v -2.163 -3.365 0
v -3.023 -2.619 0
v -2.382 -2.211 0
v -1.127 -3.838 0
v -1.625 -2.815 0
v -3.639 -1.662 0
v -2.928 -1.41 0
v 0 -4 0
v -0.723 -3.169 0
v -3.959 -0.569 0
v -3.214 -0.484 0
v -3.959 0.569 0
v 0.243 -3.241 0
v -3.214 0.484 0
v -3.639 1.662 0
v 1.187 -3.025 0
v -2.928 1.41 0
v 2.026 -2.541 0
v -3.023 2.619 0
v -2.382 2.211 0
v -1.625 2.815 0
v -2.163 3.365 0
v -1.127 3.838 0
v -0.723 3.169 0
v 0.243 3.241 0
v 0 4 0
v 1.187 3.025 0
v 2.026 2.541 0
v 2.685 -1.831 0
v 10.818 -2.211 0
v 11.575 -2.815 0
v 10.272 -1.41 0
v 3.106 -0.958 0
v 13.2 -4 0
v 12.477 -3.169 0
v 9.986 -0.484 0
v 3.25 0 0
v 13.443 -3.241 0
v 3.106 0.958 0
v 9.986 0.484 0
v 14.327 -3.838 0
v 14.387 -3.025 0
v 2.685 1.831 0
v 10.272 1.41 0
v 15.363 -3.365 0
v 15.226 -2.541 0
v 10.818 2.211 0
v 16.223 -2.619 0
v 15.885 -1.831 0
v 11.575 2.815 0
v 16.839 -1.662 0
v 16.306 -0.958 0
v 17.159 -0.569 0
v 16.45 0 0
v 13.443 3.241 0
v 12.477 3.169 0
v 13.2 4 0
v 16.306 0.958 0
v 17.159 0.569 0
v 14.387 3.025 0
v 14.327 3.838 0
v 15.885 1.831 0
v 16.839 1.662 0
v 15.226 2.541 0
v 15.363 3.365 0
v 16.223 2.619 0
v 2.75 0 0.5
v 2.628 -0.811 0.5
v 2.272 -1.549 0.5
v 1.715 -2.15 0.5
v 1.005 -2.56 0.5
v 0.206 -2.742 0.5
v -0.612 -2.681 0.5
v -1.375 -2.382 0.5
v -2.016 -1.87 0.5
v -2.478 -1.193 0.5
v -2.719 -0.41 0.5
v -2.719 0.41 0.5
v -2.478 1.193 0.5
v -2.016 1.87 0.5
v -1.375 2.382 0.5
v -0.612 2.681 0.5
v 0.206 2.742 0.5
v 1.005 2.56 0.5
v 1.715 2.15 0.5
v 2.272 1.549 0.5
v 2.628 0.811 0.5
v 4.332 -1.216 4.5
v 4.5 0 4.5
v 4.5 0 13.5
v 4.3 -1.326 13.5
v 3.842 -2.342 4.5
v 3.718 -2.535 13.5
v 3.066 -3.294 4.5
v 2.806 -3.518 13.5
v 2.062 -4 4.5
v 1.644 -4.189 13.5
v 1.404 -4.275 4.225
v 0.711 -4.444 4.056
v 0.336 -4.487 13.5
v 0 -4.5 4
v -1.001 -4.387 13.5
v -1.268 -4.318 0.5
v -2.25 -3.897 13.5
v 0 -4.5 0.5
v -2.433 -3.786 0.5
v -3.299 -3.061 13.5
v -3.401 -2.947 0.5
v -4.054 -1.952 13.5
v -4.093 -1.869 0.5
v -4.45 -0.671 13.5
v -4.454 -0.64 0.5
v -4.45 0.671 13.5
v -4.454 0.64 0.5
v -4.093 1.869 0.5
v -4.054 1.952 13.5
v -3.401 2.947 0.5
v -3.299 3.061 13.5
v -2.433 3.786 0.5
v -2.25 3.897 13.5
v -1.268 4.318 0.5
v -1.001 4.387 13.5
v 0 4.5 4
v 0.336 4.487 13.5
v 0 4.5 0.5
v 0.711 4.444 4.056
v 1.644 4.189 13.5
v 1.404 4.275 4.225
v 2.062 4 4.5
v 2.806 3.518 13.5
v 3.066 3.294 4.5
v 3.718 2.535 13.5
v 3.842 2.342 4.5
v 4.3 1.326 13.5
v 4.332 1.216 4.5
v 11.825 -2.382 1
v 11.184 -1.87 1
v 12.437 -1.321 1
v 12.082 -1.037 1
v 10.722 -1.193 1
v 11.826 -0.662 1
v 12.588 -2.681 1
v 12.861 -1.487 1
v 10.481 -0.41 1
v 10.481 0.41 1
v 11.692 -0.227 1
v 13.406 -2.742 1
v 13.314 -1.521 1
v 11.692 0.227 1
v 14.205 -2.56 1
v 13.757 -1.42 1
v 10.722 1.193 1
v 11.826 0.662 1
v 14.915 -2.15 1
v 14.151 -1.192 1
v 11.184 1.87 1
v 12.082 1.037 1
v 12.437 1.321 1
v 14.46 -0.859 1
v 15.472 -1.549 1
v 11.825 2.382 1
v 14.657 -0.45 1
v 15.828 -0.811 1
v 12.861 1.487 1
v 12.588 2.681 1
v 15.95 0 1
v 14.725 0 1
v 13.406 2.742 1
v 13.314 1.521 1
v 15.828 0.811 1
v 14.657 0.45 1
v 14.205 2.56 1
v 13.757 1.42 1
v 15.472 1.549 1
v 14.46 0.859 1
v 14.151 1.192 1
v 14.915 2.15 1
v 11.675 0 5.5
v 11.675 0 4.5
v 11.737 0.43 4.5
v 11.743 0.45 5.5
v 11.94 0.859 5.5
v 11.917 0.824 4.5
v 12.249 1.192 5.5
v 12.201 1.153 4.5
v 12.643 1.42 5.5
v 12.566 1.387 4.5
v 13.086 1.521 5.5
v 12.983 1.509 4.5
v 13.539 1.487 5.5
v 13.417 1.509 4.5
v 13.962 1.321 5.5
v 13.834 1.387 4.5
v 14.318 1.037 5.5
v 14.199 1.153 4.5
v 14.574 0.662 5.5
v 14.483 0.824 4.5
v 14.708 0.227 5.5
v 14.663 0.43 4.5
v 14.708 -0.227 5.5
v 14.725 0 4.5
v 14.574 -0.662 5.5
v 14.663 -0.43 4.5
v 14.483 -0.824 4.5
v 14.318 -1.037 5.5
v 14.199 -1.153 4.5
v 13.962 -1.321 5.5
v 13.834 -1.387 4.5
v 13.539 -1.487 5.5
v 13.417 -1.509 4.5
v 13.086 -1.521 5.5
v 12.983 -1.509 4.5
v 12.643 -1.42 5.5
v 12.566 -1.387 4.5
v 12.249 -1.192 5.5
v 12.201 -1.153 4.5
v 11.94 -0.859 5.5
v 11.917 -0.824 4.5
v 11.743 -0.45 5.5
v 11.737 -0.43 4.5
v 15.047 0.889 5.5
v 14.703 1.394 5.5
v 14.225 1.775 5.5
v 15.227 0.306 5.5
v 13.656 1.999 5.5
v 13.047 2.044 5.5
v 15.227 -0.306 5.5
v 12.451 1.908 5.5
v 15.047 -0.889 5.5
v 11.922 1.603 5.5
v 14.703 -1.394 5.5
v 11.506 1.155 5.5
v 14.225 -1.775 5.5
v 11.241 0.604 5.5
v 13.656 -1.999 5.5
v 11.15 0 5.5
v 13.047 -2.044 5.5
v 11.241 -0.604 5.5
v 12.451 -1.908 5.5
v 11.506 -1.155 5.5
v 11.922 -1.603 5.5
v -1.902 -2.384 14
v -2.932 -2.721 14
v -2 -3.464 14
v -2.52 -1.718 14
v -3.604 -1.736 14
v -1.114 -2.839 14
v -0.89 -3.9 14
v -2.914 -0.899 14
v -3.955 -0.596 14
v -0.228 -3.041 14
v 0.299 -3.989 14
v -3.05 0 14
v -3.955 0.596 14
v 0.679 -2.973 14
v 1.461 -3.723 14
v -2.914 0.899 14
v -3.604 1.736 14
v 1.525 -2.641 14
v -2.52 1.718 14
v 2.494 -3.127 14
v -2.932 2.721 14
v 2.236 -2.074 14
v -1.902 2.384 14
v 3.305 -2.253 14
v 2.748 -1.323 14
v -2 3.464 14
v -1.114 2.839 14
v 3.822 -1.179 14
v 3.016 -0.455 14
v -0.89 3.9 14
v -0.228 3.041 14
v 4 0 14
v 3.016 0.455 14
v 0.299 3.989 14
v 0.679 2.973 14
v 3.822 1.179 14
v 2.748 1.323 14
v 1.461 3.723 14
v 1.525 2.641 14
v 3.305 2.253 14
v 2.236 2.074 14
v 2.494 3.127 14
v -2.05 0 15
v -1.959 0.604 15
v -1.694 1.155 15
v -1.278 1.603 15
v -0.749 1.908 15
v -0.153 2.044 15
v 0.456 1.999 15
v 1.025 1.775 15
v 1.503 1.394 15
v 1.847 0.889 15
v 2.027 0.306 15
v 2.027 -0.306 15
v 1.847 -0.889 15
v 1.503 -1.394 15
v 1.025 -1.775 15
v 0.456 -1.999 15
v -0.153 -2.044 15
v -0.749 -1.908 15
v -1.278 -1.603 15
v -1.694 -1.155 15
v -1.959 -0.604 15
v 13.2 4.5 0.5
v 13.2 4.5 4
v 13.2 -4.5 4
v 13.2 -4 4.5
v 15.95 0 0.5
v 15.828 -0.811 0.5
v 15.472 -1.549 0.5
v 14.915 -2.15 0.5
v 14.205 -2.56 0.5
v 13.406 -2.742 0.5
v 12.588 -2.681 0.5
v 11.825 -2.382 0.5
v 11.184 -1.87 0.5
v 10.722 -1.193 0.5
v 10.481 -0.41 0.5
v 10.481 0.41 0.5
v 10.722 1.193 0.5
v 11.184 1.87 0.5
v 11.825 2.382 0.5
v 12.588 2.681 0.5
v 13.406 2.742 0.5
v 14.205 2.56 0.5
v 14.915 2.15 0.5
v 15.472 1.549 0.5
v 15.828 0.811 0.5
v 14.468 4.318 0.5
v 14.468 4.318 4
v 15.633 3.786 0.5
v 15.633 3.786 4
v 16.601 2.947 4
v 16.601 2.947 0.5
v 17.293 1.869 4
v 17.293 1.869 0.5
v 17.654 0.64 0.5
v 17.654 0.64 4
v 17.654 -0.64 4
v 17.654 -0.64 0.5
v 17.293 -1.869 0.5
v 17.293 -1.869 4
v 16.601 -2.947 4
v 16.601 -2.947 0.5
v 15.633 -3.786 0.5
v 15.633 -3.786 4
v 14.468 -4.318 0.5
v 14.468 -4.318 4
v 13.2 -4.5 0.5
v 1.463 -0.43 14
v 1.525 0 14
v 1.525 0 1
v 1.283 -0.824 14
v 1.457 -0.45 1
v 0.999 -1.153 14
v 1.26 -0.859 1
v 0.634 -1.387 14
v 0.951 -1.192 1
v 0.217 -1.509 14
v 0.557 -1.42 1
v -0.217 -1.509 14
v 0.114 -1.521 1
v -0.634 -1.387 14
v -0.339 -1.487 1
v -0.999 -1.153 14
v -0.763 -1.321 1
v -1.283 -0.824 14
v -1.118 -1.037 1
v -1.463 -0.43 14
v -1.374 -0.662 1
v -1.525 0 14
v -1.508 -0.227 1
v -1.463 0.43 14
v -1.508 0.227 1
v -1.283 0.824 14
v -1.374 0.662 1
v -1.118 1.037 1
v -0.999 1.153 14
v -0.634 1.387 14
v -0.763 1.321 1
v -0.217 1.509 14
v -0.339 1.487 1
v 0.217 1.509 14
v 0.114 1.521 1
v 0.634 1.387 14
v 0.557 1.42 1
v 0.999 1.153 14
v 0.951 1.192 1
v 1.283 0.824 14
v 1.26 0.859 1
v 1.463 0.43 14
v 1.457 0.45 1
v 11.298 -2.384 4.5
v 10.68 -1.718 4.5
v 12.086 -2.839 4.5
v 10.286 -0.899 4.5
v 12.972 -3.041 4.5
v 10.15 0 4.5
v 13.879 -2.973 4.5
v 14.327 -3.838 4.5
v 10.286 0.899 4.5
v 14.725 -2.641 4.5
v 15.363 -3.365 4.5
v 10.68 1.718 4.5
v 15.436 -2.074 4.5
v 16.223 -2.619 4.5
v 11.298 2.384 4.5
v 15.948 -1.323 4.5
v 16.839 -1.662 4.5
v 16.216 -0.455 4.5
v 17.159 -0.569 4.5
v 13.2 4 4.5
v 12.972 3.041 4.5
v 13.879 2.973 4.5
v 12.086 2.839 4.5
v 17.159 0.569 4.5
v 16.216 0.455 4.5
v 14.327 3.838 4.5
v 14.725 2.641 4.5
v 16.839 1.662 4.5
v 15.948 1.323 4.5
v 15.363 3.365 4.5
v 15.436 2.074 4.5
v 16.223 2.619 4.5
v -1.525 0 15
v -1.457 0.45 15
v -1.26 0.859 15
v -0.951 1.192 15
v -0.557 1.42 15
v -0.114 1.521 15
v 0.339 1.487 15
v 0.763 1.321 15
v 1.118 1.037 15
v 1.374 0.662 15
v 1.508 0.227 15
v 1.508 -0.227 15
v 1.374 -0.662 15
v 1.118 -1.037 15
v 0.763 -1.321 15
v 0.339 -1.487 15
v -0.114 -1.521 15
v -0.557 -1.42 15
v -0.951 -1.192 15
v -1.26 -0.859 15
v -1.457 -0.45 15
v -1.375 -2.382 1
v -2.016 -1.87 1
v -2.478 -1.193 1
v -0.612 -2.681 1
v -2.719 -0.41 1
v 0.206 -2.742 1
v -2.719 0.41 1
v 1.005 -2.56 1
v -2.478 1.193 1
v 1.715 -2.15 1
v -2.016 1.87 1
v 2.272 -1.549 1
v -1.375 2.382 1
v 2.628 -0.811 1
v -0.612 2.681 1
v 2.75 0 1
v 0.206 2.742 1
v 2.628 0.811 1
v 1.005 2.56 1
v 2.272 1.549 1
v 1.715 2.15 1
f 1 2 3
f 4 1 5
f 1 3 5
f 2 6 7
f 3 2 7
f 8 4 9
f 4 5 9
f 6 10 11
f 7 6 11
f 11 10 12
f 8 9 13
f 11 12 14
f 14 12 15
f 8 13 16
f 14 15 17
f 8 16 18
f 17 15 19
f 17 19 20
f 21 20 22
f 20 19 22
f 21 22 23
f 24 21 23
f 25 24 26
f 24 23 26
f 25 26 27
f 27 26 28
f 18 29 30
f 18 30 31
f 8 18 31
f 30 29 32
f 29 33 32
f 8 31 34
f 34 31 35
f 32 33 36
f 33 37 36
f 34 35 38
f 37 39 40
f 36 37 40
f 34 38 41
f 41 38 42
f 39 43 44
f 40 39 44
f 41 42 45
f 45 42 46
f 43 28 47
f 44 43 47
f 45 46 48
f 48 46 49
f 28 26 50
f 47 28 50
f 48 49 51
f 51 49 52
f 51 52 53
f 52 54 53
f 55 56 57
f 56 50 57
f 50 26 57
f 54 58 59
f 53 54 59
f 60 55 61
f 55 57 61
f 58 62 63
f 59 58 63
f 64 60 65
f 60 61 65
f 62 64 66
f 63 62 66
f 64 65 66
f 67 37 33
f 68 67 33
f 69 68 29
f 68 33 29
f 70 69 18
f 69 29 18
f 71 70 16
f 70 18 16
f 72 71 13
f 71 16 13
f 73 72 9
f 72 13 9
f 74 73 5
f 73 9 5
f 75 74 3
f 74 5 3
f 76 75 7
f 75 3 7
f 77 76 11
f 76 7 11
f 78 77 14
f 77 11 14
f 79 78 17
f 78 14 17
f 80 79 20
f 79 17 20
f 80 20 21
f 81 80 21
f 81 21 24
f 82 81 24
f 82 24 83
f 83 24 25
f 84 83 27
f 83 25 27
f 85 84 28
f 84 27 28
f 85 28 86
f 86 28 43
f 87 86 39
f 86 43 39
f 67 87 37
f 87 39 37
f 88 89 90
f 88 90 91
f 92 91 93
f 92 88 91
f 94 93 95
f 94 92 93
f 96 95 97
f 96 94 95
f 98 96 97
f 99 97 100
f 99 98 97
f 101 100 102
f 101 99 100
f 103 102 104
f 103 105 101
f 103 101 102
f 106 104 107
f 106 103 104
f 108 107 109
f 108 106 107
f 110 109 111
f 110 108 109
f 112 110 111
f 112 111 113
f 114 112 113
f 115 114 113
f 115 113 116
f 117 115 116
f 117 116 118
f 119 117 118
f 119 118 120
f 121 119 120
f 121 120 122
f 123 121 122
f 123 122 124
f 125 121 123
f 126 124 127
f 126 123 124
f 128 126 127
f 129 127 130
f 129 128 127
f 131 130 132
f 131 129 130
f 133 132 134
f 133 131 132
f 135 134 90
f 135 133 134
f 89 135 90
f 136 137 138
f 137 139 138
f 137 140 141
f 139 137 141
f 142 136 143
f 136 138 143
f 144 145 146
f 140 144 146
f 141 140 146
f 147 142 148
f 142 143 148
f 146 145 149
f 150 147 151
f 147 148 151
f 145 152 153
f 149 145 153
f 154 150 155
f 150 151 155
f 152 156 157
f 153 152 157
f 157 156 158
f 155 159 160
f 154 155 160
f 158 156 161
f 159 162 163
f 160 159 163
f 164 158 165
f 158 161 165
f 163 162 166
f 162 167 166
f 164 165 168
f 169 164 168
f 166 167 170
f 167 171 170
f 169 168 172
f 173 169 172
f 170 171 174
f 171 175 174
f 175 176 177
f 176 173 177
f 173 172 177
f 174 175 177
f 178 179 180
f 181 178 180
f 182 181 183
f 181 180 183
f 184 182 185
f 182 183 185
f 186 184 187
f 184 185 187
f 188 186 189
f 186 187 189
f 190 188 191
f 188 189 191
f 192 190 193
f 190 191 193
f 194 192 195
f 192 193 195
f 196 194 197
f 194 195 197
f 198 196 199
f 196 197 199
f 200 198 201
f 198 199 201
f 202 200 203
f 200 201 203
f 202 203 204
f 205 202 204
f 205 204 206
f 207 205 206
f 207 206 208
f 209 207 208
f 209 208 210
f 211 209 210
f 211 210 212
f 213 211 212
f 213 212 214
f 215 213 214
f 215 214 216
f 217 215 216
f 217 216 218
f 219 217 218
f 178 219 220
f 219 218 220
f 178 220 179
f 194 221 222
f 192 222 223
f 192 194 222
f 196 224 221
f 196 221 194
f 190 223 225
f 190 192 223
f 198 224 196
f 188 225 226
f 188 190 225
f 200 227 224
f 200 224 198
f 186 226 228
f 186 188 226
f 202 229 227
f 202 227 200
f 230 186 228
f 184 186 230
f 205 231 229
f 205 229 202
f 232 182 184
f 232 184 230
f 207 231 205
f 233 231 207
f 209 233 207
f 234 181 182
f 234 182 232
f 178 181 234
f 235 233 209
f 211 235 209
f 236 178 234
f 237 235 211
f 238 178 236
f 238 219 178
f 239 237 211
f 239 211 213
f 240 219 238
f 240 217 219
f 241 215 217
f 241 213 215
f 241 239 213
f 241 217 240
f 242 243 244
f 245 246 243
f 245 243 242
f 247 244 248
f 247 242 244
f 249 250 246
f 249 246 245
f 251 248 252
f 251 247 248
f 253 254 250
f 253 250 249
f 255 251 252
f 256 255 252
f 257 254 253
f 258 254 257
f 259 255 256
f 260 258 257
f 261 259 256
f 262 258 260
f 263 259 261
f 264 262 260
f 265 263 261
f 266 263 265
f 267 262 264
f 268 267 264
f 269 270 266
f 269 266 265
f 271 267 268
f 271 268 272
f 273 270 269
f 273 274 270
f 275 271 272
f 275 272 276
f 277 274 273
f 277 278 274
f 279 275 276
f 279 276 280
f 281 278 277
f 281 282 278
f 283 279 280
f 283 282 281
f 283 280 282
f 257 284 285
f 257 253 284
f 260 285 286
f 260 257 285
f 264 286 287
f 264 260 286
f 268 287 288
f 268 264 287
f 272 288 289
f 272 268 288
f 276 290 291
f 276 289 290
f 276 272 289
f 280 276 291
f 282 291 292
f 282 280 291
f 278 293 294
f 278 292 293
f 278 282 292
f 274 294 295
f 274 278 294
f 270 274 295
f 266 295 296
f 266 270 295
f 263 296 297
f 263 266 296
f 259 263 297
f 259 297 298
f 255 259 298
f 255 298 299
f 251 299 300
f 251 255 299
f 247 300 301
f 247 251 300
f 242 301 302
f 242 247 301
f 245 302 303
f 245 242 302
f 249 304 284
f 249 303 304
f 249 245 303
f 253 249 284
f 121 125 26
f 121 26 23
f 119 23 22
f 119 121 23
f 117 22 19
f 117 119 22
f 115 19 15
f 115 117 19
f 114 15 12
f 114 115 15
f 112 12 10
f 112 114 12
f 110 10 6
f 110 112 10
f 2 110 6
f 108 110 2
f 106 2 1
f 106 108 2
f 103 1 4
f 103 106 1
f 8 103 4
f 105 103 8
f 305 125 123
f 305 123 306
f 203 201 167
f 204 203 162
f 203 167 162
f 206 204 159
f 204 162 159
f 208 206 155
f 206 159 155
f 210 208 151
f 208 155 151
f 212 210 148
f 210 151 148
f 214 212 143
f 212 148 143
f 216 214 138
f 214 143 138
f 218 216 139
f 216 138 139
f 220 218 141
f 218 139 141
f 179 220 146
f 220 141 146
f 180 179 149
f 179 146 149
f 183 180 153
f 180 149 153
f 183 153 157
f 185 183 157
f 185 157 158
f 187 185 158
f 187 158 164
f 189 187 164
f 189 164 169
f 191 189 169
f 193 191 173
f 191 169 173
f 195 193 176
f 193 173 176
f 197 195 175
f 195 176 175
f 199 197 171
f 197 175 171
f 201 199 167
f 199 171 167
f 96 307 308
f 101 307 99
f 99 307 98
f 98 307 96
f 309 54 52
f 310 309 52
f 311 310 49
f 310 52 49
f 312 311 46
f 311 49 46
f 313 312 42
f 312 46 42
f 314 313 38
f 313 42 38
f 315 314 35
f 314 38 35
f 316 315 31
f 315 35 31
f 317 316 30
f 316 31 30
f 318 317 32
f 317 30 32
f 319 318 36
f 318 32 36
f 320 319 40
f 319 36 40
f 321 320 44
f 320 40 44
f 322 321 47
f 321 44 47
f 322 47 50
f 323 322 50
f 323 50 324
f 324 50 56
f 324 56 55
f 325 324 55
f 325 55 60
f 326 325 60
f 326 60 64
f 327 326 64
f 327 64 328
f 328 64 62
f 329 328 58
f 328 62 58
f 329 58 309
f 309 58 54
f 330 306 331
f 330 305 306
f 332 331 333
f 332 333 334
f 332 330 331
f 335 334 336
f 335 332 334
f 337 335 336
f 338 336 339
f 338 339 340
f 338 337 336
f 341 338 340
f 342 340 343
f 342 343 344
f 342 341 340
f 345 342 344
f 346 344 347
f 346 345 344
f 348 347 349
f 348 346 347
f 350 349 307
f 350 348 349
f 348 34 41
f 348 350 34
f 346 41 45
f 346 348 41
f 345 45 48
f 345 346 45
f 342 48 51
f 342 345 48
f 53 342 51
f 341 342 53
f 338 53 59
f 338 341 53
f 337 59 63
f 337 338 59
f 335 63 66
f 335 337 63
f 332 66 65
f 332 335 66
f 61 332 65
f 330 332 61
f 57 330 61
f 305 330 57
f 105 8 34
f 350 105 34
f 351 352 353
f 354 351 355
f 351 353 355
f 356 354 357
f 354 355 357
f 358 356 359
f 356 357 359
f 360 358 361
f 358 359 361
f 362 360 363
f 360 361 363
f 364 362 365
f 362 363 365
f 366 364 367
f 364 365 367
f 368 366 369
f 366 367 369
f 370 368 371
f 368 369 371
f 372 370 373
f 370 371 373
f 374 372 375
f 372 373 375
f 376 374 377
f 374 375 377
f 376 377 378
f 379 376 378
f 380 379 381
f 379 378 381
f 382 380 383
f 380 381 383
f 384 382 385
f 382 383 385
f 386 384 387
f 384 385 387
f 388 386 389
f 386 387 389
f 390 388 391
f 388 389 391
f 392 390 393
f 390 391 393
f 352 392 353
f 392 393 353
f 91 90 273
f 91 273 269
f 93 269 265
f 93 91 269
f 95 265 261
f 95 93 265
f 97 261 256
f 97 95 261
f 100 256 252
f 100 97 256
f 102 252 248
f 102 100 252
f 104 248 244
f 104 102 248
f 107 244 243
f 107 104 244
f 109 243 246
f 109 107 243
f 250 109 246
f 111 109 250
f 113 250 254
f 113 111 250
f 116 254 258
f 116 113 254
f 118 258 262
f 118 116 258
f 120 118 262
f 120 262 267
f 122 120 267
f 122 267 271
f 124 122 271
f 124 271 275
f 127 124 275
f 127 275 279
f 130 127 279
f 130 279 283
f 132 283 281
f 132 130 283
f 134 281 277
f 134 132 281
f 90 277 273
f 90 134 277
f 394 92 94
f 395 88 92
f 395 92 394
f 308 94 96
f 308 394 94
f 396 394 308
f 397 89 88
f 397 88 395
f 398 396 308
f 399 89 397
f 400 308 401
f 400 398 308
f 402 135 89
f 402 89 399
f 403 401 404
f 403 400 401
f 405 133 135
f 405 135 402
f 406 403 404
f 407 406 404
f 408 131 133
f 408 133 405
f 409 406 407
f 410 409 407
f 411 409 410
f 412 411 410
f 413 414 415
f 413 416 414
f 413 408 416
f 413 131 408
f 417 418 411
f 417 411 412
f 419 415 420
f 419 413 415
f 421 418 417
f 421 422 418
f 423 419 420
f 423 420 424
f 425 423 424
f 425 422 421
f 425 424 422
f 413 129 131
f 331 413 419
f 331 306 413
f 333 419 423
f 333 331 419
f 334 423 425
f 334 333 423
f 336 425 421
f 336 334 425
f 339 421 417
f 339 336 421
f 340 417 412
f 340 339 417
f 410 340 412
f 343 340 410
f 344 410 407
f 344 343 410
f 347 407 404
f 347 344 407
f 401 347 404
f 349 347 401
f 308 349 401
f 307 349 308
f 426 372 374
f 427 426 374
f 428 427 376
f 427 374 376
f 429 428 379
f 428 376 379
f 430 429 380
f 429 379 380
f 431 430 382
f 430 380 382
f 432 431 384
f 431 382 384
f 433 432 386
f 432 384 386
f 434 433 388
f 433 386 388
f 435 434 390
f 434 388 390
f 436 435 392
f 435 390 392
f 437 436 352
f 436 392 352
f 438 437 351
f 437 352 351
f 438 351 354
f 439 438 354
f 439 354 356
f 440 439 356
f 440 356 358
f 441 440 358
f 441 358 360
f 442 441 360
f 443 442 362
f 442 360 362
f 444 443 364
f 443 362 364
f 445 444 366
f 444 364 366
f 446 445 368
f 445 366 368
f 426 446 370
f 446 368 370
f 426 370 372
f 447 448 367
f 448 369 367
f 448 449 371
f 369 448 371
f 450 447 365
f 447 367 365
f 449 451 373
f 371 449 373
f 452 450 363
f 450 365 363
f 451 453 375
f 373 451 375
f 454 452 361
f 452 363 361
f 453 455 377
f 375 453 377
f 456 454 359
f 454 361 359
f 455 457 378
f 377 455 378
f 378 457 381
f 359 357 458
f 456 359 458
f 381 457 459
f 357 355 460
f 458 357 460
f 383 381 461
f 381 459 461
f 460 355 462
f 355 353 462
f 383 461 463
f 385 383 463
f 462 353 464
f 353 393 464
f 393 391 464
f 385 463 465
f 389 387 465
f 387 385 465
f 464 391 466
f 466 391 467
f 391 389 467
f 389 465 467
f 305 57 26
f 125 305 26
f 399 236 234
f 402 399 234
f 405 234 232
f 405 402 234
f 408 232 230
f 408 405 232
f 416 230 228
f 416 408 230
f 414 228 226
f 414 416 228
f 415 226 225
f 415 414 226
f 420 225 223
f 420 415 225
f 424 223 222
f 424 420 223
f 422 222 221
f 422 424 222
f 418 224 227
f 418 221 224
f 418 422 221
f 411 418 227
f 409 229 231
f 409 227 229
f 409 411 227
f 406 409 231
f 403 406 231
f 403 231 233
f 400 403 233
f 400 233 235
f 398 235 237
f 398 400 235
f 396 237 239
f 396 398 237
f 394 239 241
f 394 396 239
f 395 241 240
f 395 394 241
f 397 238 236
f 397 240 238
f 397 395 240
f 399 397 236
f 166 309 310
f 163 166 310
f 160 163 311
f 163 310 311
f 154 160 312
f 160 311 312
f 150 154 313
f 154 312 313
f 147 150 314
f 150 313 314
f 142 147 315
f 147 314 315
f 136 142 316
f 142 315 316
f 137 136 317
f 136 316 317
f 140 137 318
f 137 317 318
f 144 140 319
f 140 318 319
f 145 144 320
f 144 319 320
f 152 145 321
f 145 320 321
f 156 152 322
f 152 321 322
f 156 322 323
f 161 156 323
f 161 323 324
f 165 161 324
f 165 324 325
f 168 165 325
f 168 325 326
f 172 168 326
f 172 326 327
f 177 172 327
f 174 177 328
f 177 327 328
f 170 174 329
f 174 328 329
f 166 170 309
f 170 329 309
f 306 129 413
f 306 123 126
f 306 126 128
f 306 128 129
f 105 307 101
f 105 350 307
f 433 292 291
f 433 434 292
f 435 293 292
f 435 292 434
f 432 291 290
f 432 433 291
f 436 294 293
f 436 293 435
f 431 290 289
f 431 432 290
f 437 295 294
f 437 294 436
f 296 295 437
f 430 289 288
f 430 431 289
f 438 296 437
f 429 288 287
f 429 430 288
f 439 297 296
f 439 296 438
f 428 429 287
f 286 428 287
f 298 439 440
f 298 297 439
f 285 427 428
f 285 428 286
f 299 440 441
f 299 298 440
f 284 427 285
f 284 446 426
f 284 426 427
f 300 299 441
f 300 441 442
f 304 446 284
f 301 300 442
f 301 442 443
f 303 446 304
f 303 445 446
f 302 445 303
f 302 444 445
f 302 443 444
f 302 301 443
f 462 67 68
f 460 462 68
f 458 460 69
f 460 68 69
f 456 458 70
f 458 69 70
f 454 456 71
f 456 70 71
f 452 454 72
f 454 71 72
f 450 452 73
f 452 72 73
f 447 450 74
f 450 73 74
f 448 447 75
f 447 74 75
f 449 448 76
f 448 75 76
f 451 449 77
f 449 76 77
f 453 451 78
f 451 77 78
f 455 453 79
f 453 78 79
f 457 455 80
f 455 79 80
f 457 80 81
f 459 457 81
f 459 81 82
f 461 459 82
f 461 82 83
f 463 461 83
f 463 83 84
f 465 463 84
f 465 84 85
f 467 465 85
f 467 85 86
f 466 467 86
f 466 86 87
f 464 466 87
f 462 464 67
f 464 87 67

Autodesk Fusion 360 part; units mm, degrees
sketch "Sketch1" plane through (0, 0, 0) normal (0, 0, 1) x (1, 0, 0)
  circle A0 centre (0, 0) radius 1.525
  circle A1 centre (0, 0) radius 4.5
  circle A2 centre (13.2, 0) radius 1.525
  circle A3 centre (0, 0) radius 2.75
  circle A4 centre (13.2, 0) radius 2.75
  line L0 (0, 4.5) -> (13.2, 4.5)
  line L1 (13.2, -4.5) -> (0, -4.5)
  arc A5 (13.2, -4.5) -> (13.2, 4.5) centre (13.2, 0) ccw
  dimension "d1" = 3.05
  dimension "d2" = 9
  dimension "d3" = 9
  dimension "d4" = 3.05
  dimension "d5" = 5.5
  dimension "d6" = 5.5
  dimension "d7" = 13.2
extrude "Extrude1" add sketch "Sketch1" along normal blind 14 contours A1 | A3
extrude "Extrude2" add sketch "Sketch1" along normal blind 4.5 contours A1 L0 L1 A5 | A4
sketch "Sketch2" plane through (0, 0, 14) normal (0, 0, 1) x (-1, 0, 0)
  circle A0 centre (0, 0) radius 1.525
  circle A1 centre (0, 0) radius 4.5
  circle A2 centre (0, 0) radius 2.05
  dimension "d12" = 4.1
extrude "Extrude3" add sketch "Sketch2" along normal blind 1 contours A2
chamfer "Chamfer1" distance 1 angle 45 1 edges at (1.9113, -0.7413, 14)
sketch "Sketch3" plane through (0, 0, 4.5) normal (0, 0, 1) x (-1, 0, 0)
  circle A0 centre (-13.2, 0) radius 1.525
  line L0 (0, 4.5) -> (-13.2, 4.5)
  arc A1 (-13.2, 4.5) -> (-13.2, -4.5) centre (-13.2, 0) ccw
  line L1 (-13.2, -4.5) -> (0, -4.5)
  arc A2 (0, 4.5) -> (0, -4.5) centre (0, 0) ccw
  circle A3 centre (-13.2, 0) radius 2.05
  dimension "d16" = 4.1
extrude "Extrude4" add sketch "Sketch3" along normal blind 1 contours A3
chamfer "Chamfer2" distance 1 angle 45 1 edges at (15.1113, -0.7413, 4.5)
extrude "Extrude5" cut sketch "Sketch1" along normal blind 1 contours A3 | A4
chamfer "Chamfer3" distance 0.5 angle 45 10 edges at (6.6, -4.5, 0) (17.7, 0, 0) (6.6, 4.5, 0) (-4.5, 0, 0) (10.6361, -0.9944, 0) (-2.5639, -0.9944, 0) (-4.1955, -1.6273, 14) (6.6, -4.5, 4.5) (17.7, 0, 4.5) (6.6, 4.5, 4.5)
